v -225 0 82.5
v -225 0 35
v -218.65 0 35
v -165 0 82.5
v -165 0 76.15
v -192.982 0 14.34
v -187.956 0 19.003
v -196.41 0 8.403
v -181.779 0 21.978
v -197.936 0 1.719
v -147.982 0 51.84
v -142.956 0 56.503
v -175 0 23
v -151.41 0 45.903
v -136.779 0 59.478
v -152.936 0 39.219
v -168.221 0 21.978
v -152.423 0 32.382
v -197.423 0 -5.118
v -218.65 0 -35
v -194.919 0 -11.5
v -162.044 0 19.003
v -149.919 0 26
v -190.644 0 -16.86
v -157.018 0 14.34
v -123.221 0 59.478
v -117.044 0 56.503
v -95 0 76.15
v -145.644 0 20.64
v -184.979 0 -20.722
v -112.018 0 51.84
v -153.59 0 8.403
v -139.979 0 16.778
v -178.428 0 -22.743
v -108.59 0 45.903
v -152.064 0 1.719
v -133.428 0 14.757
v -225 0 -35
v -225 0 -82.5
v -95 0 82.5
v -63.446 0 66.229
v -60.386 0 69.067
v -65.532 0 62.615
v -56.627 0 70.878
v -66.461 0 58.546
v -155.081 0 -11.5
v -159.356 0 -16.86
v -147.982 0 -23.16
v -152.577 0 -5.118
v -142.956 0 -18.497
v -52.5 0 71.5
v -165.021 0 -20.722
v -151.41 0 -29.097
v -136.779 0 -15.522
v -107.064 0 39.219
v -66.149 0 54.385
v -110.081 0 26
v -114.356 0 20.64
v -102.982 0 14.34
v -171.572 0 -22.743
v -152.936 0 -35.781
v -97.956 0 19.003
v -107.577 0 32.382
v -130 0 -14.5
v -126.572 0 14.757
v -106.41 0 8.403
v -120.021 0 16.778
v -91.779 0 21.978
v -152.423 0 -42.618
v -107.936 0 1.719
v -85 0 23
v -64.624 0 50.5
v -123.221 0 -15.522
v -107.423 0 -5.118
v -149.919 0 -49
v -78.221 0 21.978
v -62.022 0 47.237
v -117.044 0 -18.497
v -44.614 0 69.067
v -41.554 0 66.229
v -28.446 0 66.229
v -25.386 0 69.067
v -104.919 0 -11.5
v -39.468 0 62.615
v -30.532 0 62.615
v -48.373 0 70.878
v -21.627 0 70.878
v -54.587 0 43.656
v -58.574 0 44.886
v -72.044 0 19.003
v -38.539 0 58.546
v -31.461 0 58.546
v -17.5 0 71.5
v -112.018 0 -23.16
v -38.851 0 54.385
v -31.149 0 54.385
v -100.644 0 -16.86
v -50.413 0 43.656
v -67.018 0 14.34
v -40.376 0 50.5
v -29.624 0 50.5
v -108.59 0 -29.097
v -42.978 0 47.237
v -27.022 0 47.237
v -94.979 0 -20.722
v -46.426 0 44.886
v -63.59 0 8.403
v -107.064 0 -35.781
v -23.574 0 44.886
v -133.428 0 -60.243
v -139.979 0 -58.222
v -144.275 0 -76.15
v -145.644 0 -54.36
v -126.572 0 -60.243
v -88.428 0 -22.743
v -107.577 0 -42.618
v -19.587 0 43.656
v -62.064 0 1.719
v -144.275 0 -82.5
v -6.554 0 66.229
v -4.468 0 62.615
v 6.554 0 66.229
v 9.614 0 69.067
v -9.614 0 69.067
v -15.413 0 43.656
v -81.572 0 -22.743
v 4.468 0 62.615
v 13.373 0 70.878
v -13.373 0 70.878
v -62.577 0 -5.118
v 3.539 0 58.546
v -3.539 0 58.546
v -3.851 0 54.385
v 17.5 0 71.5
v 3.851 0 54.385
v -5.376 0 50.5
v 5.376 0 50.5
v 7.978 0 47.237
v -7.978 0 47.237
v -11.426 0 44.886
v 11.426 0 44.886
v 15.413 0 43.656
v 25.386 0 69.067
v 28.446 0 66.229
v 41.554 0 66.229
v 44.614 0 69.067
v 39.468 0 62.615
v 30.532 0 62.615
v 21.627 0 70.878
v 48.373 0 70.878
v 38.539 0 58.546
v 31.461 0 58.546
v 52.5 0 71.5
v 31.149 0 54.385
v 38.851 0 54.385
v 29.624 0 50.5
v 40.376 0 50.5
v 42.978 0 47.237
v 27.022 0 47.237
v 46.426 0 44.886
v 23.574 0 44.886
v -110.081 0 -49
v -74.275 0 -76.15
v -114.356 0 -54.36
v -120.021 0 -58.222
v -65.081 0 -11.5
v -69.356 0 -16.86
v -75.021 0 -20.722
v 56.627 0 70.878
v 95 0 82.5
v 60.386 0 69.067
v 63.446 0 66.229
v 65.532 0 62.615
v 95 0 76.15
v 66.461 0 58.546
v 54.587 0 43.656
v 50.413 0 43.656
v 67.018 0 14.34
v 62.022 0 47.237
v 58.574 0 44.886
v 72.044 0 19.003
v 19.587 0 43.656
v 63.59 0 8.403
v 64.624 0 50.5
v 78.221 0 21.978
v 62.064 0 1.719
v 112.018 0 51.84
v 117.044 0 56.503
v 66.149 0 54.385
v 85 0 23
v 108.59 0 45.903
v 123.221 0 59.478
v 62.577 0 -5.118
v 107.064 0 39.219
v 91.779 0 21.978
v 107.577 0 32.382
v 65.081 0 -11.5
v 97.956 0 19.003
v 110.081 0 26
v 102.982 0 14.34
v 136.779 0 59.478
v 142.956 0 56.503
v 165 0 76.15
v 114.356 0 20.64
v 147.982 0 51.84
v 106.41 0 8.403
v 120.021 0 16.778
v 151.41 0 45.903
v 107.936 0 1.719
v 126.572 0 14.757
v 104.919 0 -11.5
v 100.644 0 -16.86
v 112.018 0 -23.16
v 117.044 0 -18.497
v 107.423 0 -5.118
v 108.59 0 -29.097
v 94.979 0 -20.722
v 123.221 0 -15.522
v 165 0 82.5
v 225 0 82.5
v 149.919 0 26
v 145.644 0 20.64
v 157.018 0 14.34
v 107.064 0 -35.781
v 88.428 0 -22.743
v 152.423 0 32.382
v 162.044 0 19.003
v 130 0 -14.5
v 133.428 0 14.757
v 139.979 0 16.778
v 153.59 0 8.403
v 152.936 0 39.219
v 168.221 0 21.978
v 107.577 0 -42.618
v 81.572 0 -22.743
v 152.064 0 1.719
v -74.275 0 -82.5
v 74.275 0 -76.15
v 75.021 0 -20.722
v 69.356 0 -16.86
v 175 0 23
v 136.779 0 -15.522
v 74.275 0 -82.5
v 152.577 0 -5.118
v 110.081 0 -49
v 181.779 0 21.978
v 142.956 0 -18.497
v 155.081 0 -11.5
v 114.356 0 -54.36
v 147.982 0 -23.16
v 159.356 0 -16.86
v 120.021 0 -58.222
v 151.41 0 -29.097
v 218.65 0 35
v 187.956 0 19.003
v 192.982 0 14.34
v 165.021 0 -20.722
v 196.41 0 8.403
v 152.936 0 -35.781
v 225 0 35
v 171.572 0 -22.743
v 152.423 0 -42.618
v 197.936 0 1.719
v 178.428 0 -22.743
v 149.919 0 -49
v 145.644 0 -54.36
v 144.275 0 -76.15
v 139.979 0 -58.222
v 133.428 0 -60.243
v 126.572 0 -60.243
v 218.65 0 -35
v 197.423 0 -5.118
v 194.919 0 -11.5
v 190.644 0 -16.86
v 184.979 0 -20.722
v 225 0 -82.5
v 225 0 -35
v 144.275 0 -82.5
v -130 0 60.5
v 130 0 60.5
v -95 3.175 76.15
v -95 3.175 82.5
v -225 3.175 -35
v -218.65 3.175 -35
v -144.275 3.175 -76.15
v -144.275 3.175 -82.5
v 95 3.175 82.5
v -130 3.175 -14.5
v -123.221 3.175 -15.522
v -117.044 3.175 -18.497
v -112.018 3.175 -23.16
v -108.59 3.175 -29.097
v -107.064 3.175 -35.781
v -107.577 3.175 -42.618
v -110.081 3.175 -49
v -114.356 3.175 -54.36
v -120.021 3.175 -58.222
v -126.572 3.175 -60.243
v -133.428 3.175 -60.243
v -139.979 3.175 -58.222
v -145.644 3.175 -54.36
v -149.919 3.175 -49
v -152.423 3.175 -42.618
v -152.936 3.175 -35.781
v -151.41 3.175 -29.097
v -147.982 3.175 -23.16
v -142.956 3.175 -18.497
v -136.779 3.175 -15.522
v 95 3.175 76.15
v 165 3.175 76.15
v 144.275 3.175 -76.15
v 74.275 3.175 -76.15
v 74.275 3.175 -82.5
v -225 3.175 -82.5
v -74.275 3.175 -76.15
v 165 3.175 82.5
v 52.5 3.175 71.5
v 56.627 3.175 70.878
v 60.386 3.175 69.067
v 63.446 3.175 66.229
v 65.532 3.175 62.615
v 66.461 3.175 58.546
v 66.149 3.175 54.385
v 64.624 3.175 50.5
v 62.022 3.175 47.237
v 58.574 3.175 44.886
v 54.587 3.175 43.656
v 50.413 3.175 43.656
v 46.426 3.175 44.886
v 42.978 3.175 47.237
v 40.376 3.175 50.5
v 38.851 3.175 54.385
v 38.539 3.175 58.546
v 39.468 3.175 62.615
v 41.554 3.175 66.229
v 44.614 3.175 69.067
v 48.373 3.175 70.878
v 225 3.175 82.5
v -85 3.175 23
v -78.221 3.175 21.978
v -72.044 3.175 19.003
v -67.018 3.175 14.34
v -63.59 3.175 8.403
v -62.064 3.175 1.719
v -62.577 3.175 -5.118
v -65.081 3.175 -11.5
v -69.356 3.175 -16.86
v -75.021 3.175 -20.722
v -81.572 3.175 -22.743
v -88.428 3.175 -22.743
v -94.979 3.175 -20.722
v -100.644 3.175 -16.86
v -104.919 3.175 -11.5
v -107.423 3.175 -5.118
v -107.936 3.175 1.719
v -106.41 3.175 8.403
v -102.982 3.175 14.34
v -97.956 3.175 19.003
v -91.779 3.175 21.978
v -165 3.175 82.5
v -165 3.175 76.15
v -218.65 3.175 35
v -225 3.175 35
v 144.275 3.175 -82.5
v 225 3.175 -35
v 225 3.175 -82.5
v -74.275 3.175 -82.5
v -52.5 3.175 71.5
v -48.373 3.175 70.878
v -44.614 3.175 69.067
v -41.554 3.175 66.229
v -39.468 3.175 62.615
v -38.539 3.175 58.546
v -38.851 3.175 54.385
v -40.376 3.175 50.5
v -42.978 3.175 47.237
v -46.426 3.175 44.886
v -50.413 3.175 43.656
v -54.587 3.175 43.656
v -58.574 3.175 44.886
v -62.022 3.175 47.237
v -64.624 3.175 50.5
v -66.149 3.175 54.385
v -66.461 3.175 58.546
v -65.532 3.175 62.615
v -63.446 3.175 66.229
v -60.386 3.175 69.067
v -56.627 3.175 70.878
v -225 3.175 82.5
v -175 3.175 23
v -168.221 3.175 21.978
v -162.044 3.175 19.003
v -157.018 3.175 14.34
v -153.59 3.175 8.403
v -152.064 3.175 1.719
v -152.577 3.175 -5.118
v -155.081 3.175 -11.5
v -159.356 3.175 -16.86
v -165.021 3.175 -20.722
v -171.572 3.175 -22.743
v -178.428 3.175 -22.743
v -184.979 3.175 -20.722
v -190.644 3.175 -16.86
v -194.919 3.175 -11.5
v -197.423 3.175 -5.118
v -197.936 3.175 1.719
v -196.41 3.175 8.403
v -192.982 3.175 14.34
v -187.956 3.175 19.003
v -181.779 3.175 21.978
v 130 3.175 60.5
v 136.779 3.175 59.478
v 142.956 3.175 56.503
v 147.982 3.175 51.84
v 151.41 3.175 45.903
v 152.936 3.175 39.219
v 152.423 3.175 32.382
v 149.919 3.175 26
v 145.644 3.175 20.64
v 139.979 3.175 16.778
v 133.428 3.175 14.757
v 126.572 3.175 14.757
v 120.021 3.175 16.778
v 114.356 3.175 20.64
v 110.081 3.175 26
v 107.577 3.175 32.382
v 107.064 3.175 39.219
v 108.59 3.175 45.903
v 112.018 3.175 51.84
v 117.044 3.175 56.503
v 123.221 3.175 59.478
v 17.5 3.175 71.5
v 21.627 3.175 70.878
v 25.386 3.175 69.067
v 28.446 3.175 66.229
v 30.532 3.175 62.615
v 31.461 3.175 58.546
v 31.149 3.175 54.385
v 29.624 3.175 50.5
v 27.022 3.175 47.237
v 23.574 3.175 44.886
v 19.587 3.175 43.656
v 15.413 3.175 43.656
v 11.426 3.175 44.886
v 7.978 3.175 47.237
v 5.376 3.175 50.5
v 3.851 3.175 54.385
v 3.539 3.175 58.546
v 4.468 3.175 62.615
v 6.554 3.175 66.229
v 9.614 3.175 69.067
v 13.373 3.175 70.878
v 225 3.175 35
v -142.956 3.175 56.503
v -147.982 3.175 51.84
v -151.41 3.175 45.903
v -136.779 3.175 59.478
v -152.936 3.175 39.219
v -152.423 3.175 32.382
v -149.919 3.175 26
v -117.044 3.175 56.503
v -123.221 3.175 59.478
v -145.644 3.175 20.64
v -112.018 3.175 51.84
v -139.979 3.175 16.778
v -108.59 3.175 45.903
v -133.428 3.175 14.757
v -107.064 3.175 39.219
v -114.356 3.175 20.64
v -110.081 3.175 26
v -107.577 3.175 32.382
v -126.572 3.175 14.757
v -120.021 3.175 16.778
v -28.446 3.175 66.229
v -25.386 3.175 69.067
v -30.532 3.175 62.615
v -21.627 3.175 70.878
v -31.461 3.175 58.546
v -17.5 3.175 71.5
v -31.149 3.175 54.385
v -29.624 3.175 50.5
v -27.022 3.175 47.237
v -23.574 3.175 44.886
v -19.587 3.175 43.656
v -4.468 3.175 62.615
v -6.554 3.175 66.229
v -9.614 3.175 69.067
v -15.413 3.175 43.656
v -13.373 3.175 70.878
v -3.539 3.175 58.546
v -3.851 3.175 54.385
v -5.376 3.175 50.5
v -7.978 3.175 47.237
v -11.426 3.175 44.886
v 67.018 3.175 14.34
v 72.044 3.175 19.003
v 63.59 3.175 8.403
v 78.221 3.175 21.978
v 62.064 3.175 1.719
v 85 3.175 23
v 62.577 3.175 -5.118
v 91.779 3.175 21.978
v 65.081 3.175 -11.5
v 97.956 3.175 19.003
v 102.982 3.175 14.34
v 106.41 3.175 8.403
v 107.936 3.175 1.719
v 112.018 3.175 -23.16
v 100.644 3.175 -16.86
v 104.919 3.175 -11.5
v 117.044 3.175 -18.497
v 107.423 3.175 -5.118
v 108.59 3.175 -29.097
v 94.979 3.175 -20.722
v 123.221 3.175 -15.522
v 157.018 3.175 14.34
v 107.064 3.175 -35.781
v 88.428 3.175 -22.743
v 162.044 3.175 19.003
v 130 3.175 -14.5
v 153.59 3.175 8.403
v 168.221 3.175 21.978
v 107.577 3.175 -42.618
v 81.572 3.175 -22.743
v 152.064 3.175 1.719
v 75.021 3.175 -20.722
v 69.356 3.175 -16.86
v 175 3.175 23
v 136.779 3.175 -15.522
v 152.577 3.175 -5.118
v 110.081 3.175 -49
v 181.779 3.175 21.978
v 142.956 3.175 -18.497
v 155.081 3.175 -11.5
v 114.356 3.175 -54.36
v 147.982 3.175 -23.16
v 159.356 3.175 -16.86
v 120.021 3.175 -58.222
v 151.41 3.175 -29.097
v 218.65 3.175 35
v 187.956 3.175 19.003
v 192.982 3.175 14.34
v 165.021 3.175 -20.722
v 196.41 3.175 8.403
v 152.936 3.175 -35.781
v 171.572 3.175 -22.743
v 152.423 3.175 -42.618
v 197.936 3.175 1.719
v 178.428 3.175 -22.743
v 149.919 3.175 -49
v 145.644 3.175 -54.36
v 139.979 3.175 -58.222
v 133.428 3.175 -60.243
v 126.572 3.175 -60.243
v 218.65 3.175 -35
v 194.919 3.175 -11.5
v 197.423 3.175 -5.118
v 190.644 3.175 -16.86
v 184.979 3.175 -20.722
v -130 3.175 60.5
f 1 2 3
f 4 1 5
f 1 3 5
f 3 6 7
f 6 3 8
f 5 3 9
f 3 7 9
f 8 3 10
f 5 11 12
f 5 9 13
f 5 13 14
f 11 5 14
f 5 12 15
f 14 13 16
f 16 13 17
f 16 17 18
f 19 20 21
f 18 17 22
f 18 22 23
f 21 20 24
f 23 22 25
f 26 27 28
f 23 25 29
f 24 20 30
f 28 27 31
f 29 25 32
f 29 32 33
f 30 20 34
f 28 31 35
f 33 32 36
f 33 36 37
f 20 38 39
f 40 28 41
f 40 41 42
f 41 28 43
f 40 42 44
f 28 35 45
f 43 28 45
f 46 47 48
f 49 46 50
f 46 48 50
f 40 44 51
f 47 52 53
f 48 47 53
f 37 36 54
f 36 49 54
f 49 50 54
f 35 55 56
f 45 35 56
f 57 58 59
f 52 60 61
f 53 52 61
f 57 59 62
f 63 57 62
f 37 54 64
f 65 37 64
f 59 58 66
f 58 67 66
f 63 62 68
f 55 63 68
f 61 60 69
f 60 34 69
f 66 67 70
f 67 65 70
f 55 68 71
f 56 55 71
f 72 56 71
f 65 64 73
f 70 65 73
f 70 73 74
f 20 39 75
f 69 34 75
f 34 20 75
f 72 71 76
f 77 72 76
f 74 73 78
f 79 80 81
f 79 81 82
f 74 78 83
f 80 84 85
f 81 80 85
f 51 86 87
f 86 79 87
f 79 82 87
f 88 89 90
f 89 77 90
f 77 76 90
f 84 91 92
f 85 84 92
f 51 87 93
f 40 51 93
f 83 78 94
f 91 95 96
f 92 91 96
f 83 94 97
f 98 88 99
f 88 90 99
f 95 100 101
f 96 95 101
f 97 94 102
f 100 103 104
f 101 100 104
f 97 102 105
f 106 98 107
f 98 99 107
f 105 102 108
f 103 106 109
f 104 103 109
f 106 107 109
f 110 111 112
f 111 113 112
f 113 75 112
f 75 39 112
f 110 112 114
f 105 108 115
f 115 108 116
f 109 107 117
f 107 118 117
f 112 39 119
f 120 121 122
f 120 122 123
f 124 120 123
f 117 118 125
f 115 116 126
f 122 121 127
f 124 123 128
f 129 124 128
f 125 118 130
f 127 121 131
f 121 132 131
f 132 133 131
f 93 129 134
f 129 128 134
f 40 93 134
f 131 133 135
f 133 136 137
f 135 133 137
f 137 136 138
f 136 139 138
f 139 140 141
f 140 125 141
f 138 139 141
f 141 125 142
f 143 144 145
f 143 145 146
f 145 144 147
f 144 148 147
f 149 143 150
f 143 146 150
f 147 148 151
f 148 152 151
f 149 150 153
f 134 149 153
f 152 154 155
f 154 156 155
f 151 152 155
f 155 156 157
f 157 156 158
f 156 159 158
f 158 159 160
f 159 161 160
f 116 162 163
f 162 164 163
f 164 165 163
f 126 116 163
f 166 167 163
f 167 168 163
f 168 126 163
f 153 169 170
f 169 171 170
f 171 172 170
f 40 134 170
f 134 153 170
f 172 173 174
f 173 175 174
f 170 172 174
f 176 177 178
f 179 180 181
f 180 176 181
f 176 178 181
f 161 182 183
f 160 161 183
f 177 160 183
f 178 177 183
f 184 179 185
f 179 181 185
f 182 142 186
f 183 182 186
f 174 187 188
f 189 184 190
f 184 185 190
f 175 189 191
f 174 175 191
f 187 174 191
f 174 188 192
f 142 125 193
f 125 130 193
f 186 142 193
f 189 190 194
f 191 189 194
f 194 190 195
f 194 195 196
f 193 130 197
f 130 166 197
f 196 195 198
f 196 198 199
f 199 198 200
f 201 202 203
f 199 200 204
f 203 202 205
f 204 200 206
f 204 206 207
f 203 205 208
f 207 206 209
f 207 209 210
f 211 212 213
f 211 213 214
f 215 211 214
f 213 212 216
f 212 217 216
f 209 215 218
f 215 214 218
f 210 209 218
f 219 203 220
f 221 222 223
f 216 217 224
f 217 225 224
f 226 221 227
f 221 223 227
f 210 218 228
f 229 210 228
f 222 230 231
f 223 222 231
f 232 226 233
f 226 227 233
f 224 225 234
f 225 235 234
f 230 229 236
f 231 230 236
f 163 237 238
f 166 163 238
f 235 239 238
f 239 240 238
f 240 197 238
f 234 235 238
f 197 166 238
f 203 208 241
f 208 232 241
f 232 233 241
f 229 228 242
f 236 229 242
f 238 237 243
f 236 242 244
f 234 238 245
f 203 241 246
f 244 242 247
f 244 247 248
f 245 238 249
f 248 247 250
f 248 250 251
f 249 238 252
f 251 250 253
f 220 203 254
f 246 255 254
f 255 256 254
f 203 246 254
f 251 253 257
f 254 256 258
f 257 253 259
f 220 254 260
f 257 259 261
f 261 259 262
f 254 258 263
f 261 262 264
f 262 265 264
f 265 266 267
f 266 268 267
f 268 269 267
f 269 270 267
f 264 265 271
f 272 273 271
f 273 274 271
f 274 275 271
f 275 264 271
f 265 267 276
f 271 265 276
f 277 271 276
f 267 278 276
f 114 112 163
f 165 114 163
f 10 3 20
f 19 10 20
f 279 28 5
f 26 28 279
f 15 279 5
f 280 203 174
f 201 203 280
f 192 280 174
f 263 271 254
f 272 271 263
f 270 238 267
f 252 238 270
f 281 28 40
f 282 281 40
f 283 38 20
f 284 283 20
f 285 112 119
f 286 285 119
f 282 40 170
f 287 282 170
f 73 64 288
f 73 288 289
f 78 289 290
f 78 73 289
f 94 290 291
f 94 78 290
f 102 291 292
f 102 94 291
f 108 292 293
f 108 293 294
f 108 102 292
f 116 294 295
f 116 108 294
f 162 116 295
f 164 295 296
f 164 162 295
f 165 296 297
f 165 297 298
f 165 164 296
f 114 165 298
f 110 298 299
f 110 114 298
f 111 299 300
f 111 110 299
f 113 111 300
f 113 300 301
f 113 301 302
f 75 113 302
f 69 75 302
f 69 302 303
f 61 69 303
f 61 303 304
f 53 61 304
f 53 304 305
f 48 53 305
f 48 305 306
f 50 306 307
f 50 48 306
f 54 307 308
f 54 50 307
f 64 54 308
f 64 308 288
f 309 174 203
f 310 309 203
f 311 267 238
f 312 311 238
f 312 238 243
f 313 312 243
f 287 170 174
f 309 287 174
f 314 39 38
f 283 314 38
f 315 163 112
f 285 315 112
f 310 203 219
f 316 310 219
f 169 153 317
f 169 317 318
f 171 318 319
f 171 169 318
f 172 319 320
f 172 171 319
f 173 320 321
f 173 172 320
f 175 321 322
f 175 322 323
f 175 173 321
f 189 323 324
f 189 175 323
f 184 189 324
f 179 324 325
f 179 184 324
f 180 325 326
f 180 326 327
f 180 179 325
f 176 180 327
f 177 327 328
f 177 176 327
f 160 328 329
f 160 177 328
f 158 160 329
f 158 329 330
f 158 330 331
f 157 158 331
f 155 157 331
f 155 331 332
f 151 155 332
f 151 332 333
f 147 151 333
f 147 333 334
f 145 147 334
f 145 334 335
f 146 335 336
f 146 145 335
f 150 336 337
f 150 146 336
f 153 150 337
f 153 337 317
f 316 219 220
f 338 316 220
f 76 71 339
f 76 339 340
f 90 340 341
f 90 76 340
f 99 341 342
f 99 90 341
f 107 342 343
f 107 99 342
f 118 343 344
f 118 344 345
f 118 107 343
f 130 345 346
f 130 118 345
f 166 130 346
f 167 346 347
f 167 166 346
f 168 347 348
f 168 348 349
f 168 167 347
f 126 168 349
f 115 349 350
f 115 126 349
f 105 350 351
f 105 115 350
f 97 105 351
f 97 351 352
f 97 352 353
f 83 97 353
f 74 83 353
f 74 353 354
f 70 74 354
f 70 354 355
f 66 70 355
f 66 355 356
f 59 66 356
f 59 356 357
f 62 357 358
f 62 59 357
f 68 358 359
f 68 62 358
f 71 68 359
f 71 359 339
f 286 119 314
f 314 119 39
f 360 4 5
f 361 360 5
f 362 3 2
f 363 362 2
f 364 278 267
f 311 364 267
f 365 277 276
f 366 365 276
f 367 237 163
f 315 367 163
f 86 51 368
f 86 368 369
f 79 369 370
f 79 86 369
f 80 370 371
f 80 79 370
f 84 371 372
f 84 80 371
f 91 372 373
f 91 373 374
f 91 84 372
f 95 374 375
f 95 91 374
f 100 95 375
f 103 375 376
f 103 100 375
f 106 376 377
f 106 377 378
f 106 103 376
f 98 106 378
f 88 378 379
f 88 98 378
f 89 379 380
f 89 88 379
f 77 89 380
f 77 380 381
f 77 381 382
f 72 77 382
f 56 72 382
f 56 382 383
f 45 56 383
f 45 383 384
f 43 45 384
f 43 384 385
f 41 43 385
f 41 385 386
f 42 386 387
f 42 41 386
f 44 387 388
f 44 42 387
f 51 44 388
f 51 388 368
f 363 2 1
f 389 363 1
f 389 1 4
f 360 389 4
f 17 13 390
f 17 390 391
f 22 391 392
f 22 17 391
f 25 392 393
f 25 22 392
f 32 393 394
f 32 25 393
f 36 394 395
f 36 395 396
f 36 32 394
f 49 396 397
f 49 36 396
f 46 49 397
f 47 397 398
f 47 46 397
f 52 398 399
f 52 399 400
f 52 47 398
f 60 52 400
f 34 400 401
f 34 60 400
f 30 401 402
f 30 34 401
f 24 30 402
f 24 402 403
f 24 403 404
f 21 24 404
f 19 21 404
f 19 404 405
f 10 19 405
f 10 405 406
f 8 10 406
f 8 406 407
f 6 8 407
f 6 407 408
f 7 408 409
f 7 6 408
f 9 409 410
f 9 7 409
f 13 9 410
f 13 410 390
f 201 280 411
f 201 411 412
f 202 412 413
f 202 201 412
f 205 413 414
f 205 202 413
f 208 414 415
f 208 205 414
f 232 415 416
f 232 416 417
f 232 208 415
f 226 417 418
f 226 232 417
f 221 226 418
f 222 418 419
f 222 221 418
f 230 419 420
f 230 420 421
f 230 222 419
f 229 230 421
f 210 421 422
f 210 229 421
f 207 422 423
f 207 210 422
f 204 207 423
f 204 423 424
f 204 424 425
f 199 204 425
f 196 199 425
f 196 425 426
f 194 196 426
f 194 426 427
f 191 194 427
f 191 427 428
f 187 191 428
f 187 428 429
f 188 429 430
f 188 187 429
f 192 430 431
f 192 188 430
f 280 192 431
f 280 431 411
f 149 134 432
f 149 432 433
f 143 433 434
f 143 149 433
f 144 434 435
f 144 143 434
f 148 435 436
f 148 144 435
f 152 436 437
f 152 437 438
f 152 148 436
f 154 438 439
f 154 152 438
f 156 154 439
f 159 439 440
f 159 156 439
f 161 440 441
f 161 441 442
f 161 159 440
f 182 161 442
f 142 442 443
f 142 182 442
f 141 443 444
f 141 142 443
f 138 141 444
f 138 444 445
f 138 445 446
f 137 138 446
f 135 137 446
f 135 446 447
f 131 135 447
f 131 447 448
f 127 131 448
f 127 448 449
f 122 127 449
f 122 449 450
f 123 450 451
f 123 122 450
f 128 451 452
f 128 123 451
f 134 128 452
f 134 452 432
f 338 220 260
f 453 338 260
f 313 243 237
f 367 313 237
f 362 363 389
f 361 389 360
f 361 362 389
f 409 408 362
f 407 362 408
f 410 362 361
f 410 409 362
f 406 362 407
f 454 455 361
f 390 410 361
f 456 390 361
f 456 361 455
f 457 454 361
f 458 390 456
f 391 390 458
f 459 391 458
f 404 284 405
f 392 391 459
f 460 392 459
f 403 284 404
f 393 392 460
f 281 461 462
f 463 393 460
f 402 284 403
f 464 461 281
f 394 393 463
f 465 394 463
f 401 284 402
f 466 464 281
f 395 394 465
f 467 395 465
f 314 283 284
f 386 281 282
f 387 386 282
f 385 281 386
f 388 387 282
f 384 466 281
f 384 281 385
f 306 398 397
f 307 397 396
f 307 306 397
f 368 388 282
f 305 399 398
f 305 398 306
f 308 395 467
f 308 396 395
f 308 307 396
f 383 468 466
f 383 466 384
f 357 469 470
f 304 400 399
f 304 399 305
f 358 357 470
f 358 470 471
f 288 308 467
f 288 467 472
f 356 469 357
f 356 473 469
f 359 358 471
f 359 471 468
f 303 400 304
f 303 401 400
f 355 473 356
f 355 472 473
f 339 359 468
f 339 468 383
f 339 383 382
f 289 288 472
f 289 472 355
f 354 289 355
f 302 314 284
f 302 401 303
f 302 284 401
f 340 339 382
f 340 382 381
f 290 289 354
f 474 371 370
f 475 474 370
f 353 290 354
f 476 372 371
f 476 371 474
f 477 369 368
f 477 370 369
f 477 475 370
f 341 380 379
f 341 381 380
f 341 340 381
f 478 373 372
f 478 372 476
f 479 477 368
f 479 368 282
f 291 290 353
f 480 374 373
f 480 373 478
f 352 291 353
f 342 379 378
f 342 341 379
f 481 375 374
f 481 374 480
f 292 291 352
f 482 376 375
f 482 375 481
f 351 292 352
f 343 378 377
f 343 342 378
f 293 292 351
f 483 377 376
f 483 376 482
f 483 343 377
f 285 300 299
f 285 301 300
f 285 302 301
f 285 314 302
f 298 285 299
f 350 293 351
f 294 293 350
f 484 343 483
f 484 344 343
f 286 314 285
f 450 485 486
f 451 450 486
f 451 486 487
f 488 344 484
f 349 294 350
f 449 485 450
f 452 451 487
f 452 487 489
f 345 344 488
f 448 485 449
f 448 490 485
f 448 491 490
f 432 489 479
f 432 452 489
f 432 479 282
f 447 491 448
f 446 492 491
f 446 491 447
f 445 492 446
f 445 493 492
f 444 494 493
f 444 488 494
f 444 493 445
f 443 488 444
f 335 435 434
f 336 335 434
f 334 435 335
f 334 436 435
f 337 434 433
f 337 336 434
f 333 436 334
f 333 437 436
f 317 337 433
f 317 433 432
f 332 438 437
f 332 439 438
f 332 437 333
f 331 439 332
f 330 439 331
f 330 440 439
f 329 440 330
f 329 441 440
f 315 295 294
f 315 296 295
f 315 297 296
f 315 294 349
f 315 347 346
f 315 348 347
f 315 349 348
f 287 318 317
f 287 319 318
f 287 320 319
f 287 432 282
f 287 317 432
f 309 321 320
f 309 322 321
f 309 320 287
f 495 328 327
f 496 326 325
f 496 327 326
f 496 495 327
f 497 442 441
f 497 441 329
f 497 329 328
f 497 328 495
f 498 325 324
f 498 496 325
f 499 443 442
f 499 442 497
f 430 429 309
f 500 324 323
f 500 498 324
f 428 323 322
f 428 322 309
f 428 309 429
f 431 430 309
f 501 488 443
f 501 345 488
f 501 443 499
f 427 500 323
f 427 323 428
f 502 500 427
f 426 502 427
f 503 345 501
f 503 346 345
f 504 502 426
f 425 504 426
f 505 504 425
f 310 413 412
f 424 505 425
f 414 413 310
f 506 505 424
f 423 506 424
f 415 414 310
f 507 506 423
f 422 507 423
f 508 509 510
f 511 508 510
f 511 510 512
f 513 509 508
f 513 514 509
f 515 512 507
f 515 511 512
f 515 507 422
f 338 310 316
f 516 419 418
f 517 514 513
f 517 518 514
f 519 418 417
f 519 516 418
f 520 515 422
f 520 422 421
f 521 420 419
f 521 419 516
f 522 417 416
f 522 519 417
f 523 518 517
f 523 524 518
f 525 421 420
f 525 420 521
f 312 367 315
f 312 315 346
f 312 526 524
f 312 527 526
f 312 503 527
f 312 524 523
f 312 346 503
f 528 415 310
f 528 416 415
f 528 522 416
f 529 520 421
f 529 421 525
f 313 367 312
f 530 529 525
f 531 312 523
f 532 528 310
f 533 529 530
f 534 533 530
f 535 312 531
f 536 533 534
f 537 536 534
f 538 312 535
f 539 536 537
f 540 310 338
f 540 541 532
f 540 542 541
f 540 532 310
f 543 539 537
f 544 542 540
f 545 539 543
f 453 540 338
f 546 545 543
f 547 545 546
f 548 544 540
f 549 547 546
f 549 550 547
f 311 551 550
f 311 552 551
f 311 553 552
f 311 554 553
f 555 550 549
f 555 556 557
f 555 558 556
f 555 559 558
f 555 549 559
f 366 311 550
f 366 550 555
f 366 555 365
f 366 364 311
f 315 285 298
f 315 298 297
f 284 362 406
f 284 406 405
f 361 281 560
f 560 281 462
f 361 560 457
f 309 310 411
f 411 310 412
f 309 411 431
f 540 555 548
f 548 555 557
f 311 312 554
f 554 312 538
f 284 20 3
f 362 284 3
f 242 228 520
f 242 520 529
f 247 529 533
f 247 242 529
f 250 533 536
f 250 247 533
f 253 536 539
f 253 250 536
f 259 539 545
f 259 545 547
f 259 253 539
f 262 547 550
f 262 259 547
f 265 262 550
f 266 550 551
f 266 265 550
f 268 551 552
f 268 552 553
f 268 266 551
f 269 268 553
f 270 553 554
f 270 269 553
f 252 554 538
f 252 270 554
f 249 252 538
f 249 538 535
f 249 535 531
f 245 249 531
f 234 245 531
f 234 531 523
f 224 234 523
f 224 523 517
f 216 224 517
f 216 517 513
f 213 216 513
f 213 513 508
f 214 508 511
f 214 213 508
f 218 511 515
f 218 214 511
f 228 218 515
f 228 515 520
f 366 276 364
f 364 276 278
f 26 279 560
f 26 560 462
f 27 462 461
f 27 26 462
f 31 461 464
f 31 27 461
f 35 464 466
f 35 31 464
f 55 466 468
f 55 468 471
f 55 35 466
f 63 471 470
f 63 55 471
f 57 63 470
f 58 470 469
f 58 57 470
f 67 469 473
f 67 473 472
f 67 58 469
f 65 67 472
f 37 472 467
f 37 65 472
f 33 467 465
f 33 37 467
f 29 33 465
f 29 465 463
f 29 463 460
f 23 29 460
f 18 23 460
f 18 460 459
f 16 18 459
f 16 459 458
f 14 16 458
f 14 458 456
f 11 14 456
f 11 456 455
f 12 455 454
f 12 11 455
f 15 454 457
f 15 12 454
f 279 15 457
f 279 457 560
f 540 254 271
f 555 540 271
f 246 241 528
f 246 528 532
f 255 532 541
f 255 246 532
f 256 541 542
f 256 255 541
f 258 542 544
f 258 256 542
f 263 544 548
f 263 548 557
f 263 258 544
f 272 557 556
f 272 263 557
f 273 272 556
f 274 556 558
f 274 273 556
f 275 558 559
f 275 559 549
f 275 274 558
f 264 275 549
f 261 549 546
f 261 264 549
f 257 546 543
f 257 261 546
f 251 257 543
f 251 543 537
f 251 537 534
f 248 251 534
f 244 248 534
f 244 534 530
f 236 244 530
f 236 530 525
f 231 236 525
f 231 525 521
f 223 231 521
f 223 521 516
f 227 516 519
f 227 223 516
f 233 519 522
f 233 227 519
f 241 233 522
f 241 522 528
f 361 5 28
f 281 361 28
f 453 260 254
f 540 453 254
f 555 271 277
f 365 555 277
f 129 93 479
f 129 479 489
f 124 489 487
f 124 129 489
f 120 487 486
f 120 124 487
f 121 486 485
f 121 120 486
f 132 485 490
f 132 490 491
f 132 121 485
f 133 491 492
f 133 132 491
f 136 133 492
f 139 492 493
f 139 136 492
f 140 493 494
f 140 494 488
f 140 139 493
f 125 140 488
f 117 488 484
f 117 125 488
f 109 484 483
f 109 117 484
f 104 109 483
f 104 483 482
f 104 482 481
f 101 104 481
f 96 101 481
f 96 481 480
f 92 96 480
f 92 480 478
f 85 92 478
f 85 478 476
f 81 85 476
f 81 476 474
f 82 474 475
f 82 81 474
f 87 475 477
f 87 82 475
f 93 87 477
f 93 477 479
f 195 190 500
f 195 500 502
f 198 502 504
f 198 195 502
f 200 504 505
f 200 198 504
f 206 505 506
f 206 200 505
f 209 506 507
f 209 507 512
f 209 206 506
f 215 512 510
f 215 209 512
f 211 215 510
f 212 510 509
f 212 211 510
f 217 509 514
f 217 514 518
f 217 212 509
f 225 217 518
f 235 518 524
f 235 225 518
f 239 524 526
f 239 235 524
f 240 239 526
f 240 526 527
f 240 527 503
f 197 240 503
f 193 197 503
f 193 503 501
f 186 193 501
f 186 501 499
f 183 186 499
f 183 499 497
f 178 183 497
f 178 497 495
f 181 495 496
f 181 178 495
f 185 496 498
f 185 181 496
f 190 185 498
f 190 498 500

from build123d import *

# Parameters (mm, degrees)
SKETCH1_R           = 23
SKETCH1_R_2         = 14
BOSS_EXTRUDE1_DEPTH = 3.175


with BuildPart() as part:
    # Sketch1 → Boss-Extrude1 (new body)
    with BuildSketch(Plane(origin=(0, 0, 0), x_dir=(1, 0, 0), z_dir=(0, 1, 0))):
        Polygon((74.275, 82.5), (-74.275, 82.5), (-74.275, 76.15), (-144.275, 76.15), (-144.275, 82.5), (-225, 82.5), (-225, 35), (-218.65, 35), (-218.65, -35), (-225, -35), (-225, -82.5), (-165, -82.5), (-165, -76.15), (-95, -76.15), (-95, -82.5), (95, -82.5), (95, -76.15), (165, -76.15), (165, -82.5), (225, -82.5), (225, -35), (218.65, -35), (218.65, 35), (225, 35), (225, 82.5), (144.275, 82.5), (144.275, 76.15), (74.275, 76.15), align=None)
        with Locations(Location((-130, 37.5, 0), (0, 0, 270))):  # turned: the seam where the file's is
            Circle(SKETCH1_R, mode=Mode.SUBTRACT)
        with Locations(Location((-85, 0, 0), (0, 0, 270))):  # turned: the seam where the file's is
            Circle(SKETCH1_R, mode=Mode.SUBTRACT)
        with Locations(Location((-175, 0, 0), (0, 0, 270))):  # turned: the seam where the file's is
            Circle(SKETCH1_R, mode=Mode.SUBTRACT)
        with Locations(Location((-130, -37.5, 0), (0, 0, 270))):  # turned: the seam where the file's is
            Circle(SKETCH1_R, mode=Mode.SUBTRACT)
        with Locations(Location((130, 37.5, 0), (0, 0, 270))):  # turned: the seam where the file's is
            Circle(SKETCH1_R, mode=Mode.SUBTRACT)
        with Locations(Location((85, 0, 0), (0, 0, 270))):  # turned: the seam where the file's is
            Circle(SKETCH1_R, mode=Mode.SUBTRACT)
        with Locations(Location((175, 0, 0), (0, 0, 270))):  # turned: the seam where the file's is
            Circle(SKETCH1_R, mode=Mode.SUBTRACT)
        with Locations(Location((130, -37.5, 0), (0, 0, 270))):  # turned: the seam where the file's is
            Circle(SKETCH1_R, mode=Mode.SUBTRACT)
        with Locations(Location((-52.5, -57.5, 0), (0, 0, 270))):  # turned: the seam where the file's is
            Circle(SKETCH1_R_2, mode=Mode.SUBTRACT)
        with Locations(Location((-17.5, -57.5, 0), (0, 0, 270))):  # turned: the seam where the file's is
            Circle(SKETCH1_R_2, mode=Mode.SUBTRACT)
        with Locations(Location((17.5, -57.5, 0), (0, 0, 270))):  # turned: the seam where the file's is
            Circle(SKETCH1_R_2, mode=Mode.SUBTRACT)
        with Locations(Location((52.5, -57.5, 0), (0, 0, 270))):  # turned: the seam where the file's is
            Circle(SKETCH1_R_2, mode=Mode.SUBTRACT)
    extrude(amount=BOSS_EXTRUDE1_DEPTH)


solid = part.part
